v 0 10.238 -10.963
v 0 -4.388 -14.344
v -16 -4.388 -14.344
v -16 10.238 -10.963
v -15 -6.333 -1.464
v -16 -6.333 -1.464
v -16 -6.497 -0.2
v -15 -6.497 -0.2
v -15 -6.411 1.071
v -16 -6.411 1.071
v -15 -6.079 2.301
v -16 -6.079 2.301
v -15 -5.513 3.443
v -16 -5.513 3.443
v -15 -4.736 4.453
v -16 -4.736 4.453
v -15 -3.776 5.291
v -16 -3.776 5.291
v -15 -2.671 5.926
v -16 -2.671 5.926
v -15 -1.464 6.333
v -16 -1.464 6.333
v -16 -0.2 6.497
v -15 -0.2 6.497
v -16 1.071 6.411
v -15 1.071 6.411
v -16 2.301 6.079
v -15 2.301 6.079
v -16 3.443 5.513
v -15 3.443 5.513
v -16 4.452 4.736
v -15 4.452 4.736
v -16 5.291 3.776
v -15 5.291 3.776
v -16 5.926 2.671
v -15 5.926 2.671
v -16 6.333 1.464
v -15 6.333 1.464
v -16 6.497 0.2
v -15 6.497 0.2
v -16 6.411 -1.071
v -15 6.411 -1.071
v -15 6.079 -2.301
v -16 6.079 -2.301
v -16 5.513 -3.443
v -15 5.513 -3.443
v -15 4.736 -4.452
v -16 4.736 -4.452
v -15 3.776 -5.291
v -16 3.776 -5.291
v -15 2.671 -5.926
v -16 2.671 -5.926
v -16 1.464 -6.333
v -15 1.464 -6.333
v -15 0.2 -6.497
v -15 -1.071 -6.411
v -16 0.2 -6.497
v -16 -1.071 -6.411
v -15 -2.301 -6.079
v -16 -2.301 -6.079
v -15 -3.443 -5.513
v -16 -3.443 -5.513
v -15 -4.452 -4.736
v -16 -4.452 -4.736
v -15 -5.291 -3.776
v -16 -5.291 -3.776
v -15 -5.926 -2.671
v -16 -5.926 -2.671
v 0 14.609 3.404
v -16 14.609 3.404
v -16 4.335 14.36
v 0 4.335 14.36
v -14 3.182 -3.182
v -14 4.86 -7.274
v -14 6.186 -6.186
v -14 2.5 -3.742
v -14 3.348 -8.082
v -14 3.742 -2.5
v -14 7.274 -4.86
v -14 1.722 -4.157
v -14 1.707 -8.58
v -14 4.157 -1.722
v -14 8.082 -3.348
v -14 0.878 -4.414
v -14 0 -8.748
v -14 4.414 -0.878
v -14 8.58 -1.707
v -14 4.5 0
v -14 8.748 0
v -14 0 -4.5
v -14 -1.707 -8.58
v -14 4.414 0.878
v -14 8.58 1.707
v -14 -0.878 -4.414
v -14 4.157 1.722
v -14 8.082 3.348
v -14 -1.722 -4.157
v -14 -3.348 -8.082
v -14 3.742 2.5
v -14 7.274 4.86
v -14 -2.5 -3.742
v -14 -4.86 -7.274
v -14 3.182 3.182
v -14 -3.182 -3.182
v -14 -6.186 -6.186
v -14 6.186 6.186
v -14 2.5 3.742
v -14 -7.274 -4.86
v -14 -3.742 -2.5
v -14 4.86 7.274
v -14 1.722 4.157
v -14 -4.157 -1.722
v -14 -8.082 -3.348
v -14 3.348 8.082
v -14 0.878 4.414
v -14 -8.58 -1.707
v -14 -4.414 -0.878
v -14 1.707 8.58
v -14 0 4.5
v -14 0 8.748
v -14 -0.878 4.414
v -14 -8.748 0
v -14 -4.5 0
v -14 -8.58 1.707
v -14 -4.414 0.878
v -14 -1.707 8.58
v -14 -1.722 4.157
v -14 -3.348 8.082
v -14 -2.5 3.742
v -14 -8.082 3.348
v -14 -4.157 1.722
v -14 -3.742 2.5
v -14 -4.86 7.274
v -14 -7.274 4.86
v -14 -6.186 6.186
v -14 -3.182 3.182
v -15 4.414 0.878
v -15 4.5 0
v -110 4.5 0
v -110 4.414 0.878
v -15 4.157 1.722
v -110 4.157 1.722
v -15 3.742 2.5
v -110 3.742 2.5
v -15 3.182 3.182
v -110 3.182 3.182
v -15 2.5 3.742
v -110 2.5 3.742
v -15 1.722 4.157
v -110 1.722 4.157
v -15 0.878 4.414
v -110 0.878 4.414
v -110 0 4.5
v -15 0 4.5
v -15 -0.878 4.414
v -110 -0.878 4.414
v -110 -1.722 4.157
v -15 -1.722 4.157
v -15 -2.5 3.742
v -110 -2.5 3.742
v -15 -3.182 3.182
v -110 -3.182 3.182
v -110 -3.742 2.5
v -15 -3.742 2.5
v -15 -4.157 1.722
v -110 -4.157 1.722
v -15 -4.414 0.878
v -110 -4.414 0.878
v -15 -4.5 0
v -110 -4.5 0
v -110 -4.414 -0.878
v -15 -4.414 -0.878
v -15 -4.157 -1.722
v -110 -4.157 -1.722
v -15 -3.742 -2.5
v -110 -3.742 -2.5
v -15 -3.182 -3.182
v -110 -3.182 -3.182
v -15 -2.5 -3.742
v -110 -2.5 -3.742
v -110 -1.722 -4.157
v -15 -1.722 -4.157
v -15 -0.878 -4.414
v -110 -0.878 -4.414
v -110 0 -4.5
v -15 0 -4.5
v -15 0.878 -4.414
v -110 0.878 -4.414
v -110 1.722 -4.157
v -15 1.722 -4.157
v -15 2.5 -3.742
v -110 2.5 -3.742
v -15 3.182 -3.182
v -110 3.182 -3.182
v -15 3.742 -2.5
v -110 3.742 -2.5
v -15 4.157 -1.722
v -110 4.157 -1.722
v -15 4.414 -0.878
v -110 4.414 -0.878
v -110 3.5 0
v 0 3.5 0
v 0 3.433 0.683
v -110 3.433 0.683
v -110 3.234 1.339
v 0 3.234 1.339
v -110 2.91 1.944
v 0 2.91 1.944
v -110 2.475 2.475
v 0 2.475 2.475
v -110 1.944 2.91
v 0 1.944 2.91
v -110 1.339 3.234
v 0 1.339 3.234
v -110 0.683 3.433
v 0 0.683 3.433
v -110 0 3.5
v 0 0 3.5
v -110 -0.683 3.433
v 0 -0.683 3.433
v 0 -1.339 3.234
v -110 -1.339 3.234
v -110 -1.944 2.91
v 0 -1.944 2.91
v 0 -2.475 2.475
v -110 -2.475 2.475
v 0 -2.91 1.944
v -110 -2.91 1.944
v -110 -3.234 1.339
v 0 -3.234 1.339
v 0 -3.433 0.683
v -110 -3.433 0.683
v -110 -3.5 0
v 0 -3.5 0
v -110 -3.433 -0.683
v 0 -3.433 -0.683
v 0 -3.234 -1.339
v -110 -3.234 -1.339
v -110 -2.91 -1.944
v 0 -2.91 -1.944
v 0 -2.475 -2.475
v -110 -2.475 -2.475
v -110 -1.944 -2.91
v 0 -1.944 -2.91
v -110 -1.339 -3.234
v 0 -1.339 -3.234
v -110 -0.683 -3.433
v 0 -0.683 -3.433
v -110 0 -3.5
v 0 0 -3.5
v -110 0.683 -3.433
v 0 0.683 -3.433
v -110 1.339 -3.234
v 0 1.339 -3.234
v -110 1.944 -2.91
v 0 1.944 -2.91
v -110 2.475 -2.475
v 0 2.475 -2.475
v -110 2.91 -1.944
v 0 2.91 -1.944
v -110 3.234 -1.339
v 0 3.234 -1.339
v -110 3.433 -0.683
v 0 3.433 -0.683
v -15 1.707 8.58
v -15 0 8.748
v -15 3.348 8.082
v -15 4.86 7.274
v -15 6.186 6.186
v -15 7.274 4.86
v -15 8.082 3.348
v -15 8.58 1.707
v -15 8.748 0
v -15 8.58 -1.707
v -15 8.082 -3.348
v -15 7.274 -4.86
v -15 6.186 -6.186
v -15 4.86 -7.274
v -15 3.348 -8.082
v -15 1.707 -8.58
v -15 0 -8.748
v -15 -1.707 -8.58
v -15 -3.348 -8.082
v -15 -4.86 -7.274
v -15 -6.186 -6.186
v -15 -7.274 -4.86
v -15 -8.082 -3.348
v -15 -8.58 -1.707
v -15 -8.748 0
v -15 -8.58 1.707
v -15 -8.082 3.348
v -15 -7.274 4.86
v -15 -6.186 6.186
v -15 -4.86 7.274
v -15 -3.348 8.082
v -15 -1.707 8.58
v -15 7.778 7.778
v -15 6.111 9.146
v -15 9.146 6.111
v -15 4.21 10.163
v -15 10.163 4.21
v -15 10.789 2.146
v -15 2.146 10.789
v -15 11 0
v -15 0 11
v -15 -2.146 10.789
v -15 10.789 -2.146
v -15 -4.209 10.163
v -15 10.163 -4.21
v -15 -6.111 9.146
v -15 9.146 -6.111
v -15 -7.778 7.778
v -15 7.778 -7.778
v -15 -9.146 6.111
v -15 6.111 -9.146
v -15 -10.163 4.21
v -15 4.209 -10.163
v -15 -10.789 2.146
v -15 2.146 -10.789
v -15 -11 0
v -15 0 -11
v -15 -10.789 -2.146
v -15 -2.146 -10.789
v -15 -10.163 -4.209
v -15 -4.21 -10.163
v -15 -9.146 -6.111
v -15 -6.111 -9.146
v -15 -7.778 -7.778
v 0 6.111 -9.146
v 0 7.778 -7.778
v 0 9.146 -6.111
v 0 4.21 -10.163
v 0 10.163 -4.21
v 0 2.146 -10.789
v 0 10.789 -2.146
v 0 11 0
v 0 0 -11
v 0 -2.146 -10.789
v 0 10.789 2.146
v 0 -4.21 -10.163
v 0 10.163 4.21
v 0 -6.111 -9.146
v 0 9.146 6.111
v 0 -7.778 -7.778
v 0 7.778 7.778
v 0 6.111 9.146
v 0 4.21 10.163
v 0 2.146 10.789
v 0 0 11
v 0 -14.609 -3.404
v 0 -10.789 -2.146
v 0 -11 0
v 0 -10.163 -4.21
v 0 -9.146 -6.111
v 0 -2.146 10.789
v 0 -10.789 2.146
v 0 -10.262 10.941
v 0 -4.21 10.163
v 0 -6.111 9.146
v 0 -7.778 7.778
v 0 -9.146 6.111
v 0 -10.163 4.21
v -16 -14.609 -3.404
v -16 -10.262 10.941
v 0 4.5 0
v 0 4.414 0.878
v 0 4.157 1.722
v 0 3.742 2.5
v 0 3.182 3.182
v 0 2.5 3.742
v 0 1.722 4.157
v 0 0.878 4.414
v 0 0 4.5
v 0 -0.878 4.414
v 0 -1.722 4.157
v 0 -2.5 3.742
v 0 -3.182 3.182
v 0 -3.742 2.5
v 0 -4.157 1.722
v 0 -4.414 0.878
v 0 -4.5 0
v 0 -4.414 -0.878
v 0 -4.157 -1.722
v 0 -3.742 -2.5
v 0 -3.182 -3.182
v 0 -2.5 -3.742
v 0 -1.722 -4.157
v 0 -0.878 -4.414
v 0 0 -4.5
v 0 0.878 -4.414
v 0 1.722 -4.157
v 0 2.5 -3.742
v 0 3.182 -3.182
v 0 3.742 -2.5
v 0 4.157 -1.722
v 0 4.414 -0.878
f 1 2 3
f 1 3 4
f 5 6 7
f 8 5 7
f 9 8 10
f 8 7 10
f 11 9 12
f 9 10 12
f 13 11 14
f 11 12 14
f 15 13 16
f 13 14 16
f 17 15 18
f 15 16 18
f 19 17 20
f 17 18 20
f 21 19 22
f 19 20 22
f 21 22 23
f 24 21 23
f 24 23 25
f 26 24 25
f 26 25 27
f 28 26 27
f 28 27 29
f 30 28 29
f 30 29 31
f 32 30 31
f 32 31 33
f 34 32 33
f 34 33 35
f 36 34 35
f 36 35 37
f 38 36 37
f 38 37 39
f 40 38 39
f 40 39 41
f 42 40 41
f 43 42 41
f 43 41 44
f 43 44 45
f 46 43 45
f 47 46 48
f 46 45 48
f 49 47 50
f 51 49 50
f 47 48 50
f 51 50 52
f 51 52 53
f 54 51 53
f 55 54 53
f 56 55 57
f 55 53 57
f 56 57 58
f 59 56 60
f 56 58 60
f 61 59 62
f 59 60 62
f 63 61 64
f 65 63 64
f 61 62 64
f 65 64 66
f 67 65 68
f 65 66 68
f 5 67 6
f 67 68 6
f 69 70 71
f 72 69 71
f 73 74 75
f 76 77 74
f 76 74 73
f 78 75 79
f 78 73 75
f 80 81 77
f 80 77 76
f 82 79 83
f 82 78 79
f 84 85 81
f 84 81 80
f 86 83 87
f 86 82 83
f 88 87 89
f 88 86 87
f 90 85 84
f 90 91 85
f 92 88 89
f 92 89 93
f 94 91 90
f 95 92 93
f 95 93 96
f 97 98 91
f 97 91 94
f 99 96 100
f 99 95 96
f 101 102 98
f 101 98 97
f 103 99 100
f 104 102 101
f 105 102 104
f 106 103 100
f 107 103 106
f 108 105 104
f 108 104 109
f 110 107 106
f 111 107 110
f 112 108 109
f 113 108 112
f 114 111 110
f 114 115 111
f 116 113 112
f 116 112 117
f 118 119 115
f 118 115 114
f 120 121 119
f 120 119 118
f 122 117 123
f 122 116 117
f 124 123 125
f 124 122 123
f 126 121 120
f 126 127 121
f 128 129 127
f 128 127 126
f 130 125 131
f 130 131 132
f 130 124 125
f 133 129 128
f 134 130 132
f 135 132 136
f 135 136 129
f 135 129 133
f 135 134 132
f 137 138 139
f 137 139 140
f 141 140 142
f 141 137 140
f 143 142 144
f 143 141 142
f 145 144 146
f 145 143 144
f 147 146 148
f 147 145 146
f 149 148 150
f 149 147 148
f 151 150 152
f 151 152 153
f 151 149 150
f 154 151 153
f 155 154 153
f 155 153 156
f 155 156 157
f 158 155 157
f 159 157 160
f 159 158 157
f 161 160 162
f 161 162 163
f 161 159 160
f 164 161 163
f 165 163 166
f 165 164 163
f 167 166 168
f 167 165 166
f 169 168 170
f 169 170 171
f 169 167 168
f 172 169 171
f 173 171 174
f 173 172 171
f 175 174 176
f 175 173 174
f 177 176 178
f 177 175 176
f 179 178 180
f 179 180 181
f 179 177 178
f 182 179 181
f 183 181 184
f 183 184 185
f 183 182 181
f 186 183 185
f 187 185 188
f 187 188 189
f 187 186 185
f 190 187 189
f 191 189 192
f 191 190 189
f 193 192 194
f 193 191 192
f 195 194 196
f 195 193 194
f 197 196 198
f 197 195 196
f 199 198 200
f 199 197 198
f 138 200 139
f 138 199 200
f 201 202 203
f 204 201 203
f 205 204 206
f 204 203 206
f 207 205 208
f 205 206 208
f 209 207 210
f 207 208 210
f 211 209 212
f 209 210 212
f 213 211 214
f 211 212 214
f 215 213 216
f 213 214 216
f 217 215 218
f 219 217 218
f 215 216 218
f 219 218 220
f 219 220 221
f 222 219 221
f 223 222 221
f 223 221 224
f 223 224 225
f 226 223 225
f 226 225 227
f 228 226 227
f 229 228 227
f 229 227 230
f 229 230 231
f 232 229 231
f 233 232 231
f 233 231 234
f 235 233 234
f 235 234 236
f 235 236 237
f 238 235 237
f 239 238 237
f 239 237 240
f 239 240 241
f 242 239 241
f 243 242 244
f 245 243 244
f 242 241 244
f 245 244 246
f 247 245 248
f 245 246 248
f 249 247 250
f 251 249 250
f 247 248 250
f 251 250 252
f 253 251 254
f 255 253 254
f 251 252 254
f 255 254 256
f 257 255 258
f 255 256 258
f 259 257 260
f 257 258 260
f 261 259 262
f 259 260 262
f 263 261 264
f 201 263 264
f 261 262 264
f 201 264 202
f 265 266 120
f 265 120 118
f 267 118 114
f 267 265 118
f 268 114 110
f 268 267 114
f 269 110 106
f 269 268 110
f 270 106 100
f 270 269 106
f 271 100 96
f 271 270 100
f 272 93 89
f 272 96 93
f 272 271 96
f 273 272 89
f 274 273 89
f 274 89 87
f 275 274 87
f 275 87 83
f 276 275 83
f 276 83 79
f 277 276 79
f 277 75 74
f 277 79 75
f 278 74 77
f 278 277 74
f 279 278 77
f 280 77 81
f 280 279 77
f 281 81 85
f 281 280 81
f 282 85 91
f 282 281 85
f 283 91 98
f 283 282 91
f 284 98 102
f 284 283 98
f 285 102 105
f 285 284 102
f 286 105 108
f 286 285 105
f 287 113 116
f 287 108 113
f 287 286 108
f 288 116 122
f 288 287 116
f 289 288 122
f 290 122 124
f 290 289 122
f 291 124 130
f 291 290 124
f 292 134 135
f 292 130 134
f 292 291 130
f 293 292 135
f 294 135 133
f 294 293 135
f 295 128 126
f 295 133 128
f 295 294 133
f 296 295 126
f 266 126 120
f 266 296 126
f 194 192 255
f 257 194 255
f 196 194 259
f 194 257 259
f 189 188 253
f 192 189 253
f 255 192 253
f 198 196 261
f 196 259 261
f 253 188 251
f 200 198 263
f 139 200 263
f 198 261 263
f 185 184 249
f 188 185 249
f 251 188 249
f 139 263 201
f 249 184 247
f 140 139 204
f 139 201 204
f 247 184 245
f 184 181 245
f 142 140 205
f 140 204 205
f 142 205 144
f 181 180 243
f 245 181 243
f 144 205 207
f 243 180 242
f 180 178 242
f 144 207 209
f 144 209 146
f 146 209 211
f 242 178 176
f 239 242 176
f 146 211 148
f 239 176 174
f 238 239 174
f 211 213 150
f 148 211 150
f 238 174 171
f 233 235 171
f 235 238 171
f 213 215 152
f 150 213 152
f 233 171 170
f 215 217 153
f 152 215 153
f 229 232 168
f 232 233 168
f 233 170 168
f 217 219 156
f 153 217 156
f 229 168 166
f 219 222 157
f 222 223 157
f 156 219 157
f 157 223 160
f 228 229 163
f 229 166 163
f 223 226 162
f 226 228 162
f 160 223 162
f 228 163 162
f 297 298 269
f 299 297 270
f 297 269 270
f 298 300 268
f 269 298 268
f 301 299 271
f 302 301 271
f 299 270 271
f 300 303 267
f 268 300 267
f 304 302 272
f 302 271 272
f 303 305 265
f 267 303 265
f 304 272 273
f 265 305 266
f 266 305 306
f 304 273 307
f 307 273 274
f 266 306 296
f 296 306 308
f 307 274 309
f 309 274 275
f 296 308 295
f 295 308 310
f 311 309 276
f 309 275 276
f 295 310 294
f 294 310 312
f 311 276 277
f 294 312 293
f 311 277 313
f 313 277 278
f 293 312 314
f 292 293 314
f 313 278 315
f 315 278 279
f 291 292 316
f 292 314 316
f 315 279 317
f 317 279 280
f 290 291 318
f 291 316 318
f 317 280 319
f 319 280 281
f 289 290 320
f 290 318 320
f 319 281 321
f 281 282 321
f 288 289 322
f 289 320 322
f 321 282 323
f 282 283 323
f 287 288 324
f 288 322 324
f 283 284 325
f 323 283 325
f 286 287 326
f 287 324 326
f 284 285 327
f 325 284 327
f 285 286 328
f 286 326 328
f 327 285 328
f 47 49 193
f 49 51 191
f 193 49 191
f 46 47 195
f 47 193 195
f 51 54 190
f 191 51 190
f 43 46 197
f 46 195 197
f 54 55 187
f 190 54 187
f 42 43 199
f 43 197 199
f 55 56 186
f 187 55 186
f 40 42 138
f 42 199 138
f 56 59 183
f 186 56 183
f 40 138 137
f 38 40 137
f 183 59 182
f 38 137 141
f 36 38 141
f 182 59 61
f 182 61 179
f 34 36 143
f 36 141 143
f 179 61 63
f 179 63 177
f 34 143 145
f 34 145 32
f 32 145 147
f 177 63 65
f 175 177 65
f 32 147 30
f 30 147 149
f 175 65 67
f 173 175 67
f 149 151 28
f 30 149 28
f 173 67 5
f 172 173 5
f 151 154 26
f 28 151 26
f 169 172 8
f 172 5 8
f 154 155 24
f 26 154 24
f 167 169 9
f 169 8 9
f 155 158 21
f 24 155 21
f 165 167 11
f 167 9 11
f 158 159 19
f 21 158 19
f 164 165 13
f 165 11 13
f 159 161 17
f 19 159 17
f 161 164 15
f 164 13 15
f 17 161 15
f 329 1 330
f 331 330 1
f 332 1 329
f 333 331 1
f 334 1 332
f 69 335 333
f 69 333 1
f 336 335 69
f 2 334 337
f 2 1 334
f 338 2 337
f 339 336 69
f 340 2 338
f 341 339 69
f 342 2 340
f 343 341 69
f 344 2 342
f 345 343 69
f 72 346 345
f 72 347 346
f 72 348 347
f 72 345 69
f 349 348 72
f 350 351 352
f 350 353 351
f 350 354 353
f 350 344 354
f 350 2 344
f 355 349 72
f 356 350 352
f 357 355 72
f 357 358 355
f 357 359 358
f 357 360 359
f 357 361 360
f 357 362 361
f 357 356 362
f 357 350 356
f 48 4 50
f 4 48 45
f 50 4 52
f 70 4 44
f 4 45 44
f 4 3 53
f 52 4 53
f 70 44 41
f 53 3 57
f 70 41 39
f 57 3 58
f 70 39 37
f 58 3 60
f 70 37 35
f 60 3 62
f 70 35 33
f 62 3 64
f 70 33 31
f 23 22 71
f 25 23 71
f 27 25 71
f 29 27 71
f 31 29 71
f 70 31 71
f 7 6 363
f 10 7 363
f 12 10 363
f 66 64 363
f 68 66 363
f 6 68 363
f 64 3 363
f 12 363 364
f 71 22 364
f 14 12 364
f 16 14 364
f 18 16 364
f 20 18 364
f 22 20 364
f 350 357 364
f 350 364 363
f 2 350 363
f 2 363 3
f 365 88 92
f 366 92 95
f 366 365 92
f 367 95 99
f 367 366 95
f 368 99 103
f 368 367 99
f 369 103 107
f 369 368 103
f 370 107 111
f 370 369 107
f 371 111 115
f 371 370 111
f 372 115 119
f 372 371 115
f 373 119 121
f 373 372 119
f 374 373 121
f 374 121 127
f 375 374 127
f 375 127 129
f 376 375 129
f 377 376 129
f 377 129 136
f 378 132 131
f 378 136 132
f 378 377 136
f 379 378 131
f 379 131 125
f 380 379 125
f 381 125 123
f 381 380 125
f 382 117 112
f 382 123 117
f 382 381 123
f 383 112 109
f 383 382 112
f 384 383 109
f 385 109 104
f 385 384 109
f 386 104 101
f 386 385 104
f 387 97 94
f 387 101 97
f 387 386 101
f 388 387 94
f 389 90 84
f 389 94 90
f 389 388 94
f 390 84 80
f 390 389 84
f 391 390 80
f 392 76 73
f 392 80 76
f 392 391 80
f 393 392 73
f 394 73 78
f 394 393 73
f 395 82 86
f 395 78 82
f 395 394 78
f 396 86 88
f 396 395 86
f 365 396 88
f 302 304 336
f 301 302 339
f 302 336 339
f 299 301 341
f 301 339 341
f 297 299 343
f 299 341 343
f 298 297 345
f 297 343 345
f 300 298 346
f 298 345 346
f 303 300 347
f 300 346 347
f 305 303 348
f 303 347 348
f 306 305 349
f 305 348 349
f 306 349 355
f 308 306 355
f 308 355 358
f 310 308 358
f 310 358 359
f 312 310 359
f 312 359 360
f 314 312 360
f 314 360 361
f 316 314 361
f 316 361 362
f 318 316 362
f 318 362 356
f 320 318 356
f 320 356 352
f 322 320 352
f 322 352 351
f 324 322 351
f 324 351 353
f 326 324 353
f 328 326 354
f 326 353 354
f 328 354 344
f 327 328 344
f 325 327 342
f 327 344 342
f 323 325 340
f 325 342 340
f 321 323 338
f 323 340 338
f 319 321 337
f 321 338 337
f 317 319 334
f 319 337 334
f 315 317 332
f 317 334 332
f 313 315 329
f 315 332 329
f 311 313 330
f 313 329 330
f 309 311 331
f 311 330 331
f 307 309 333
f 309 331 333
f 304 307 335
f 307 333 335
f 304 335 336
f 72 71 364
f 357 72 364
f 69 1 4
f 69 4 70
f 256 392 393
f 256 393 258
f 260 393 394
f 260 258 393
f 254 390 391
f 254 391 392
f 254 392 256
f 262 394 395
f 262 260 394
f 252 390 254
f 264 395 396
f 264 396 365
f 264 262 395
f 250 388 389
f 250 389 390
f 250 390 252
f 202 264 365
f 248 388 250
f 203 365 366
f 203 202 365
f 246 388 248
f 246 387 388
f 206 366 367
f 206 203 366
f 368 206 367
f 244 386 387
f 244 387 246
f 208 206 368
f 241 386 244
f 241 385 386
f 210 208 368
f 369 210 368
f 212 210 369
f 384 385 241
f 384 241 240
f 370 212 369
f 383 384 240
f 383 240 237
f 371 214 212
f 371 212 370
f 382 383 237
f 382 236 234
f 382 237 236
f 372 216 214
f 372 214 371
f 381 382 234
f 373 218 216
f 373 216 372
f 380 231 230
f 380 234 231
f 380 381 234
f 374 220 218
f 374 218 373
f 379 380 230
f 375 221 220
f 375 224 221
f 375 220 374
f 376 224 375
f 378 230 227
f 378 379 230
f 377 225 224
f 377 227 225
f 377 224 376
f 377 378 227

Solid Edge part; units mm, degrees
sketch "Sketch1" plane through (0, 0, 0) normal (1, 0, 0) x (0, 1, 0)
  circle A0 centre (0, 0) radius 11
  line L0 (10.238, -10.9628) -> (14.6087, 3.404)
  line L1 (14.6087, 3.404) -> (4.3353, 14.3598)
  line L2 (4.3353, 14.3598) -> (-10.2618, 10.9406)
  line L3 (-10.2618, 10.9406) -> (-14.6087, -3.404)
  line L4 (-14.6087, -3.404) -> (-4.3883, -14.3437)
  line L5 (-4.3883, -14.3437) -> (10.238, -10.9628)
extrude "Protrusion1" add sketch "Sketch1" against normal blind 16
cosmetic_thread "Thread1" size "Tr 24 x 2"
sketch "Sketch2" plane through (-16, 0, 0.0081) normal (-1, 0, 0) x (0, -0.9743092, -0.2252144)
  circle A0 centre (0.0018, -0.0078) radius 6.5
  circle A1 centre (0.0018, -0.0078) radius 11
extrude "ExtrudedProtrusion_2" add sketch "Sketch2" against normal blind 1
sketch "Sketch3" plane through (0, 0, 0) normal (1, 0, 0) x (0, 1, 0)
  circle A0 centre (0, 0) radius 3.5
  circle A1 centre (0, 0) radius 4.5
extrude "ExtrudedProtrusion_4" add sketch "Sketch3" against normal blind 110
sketch "Sketch4" plane through (-15, 0, 0) normal (1, 0, 0) x (0, 0, 1)
  circle A0 centre (0, 0) radius 8.7483
  circle A1 centre (0, 0) radius 4.5
extrude "ExtrudedProtrusion_5" add sketch "Sketch4" along normal blind 1
cosmetic_thread "Thread_3" size "M9" thread depth 15
